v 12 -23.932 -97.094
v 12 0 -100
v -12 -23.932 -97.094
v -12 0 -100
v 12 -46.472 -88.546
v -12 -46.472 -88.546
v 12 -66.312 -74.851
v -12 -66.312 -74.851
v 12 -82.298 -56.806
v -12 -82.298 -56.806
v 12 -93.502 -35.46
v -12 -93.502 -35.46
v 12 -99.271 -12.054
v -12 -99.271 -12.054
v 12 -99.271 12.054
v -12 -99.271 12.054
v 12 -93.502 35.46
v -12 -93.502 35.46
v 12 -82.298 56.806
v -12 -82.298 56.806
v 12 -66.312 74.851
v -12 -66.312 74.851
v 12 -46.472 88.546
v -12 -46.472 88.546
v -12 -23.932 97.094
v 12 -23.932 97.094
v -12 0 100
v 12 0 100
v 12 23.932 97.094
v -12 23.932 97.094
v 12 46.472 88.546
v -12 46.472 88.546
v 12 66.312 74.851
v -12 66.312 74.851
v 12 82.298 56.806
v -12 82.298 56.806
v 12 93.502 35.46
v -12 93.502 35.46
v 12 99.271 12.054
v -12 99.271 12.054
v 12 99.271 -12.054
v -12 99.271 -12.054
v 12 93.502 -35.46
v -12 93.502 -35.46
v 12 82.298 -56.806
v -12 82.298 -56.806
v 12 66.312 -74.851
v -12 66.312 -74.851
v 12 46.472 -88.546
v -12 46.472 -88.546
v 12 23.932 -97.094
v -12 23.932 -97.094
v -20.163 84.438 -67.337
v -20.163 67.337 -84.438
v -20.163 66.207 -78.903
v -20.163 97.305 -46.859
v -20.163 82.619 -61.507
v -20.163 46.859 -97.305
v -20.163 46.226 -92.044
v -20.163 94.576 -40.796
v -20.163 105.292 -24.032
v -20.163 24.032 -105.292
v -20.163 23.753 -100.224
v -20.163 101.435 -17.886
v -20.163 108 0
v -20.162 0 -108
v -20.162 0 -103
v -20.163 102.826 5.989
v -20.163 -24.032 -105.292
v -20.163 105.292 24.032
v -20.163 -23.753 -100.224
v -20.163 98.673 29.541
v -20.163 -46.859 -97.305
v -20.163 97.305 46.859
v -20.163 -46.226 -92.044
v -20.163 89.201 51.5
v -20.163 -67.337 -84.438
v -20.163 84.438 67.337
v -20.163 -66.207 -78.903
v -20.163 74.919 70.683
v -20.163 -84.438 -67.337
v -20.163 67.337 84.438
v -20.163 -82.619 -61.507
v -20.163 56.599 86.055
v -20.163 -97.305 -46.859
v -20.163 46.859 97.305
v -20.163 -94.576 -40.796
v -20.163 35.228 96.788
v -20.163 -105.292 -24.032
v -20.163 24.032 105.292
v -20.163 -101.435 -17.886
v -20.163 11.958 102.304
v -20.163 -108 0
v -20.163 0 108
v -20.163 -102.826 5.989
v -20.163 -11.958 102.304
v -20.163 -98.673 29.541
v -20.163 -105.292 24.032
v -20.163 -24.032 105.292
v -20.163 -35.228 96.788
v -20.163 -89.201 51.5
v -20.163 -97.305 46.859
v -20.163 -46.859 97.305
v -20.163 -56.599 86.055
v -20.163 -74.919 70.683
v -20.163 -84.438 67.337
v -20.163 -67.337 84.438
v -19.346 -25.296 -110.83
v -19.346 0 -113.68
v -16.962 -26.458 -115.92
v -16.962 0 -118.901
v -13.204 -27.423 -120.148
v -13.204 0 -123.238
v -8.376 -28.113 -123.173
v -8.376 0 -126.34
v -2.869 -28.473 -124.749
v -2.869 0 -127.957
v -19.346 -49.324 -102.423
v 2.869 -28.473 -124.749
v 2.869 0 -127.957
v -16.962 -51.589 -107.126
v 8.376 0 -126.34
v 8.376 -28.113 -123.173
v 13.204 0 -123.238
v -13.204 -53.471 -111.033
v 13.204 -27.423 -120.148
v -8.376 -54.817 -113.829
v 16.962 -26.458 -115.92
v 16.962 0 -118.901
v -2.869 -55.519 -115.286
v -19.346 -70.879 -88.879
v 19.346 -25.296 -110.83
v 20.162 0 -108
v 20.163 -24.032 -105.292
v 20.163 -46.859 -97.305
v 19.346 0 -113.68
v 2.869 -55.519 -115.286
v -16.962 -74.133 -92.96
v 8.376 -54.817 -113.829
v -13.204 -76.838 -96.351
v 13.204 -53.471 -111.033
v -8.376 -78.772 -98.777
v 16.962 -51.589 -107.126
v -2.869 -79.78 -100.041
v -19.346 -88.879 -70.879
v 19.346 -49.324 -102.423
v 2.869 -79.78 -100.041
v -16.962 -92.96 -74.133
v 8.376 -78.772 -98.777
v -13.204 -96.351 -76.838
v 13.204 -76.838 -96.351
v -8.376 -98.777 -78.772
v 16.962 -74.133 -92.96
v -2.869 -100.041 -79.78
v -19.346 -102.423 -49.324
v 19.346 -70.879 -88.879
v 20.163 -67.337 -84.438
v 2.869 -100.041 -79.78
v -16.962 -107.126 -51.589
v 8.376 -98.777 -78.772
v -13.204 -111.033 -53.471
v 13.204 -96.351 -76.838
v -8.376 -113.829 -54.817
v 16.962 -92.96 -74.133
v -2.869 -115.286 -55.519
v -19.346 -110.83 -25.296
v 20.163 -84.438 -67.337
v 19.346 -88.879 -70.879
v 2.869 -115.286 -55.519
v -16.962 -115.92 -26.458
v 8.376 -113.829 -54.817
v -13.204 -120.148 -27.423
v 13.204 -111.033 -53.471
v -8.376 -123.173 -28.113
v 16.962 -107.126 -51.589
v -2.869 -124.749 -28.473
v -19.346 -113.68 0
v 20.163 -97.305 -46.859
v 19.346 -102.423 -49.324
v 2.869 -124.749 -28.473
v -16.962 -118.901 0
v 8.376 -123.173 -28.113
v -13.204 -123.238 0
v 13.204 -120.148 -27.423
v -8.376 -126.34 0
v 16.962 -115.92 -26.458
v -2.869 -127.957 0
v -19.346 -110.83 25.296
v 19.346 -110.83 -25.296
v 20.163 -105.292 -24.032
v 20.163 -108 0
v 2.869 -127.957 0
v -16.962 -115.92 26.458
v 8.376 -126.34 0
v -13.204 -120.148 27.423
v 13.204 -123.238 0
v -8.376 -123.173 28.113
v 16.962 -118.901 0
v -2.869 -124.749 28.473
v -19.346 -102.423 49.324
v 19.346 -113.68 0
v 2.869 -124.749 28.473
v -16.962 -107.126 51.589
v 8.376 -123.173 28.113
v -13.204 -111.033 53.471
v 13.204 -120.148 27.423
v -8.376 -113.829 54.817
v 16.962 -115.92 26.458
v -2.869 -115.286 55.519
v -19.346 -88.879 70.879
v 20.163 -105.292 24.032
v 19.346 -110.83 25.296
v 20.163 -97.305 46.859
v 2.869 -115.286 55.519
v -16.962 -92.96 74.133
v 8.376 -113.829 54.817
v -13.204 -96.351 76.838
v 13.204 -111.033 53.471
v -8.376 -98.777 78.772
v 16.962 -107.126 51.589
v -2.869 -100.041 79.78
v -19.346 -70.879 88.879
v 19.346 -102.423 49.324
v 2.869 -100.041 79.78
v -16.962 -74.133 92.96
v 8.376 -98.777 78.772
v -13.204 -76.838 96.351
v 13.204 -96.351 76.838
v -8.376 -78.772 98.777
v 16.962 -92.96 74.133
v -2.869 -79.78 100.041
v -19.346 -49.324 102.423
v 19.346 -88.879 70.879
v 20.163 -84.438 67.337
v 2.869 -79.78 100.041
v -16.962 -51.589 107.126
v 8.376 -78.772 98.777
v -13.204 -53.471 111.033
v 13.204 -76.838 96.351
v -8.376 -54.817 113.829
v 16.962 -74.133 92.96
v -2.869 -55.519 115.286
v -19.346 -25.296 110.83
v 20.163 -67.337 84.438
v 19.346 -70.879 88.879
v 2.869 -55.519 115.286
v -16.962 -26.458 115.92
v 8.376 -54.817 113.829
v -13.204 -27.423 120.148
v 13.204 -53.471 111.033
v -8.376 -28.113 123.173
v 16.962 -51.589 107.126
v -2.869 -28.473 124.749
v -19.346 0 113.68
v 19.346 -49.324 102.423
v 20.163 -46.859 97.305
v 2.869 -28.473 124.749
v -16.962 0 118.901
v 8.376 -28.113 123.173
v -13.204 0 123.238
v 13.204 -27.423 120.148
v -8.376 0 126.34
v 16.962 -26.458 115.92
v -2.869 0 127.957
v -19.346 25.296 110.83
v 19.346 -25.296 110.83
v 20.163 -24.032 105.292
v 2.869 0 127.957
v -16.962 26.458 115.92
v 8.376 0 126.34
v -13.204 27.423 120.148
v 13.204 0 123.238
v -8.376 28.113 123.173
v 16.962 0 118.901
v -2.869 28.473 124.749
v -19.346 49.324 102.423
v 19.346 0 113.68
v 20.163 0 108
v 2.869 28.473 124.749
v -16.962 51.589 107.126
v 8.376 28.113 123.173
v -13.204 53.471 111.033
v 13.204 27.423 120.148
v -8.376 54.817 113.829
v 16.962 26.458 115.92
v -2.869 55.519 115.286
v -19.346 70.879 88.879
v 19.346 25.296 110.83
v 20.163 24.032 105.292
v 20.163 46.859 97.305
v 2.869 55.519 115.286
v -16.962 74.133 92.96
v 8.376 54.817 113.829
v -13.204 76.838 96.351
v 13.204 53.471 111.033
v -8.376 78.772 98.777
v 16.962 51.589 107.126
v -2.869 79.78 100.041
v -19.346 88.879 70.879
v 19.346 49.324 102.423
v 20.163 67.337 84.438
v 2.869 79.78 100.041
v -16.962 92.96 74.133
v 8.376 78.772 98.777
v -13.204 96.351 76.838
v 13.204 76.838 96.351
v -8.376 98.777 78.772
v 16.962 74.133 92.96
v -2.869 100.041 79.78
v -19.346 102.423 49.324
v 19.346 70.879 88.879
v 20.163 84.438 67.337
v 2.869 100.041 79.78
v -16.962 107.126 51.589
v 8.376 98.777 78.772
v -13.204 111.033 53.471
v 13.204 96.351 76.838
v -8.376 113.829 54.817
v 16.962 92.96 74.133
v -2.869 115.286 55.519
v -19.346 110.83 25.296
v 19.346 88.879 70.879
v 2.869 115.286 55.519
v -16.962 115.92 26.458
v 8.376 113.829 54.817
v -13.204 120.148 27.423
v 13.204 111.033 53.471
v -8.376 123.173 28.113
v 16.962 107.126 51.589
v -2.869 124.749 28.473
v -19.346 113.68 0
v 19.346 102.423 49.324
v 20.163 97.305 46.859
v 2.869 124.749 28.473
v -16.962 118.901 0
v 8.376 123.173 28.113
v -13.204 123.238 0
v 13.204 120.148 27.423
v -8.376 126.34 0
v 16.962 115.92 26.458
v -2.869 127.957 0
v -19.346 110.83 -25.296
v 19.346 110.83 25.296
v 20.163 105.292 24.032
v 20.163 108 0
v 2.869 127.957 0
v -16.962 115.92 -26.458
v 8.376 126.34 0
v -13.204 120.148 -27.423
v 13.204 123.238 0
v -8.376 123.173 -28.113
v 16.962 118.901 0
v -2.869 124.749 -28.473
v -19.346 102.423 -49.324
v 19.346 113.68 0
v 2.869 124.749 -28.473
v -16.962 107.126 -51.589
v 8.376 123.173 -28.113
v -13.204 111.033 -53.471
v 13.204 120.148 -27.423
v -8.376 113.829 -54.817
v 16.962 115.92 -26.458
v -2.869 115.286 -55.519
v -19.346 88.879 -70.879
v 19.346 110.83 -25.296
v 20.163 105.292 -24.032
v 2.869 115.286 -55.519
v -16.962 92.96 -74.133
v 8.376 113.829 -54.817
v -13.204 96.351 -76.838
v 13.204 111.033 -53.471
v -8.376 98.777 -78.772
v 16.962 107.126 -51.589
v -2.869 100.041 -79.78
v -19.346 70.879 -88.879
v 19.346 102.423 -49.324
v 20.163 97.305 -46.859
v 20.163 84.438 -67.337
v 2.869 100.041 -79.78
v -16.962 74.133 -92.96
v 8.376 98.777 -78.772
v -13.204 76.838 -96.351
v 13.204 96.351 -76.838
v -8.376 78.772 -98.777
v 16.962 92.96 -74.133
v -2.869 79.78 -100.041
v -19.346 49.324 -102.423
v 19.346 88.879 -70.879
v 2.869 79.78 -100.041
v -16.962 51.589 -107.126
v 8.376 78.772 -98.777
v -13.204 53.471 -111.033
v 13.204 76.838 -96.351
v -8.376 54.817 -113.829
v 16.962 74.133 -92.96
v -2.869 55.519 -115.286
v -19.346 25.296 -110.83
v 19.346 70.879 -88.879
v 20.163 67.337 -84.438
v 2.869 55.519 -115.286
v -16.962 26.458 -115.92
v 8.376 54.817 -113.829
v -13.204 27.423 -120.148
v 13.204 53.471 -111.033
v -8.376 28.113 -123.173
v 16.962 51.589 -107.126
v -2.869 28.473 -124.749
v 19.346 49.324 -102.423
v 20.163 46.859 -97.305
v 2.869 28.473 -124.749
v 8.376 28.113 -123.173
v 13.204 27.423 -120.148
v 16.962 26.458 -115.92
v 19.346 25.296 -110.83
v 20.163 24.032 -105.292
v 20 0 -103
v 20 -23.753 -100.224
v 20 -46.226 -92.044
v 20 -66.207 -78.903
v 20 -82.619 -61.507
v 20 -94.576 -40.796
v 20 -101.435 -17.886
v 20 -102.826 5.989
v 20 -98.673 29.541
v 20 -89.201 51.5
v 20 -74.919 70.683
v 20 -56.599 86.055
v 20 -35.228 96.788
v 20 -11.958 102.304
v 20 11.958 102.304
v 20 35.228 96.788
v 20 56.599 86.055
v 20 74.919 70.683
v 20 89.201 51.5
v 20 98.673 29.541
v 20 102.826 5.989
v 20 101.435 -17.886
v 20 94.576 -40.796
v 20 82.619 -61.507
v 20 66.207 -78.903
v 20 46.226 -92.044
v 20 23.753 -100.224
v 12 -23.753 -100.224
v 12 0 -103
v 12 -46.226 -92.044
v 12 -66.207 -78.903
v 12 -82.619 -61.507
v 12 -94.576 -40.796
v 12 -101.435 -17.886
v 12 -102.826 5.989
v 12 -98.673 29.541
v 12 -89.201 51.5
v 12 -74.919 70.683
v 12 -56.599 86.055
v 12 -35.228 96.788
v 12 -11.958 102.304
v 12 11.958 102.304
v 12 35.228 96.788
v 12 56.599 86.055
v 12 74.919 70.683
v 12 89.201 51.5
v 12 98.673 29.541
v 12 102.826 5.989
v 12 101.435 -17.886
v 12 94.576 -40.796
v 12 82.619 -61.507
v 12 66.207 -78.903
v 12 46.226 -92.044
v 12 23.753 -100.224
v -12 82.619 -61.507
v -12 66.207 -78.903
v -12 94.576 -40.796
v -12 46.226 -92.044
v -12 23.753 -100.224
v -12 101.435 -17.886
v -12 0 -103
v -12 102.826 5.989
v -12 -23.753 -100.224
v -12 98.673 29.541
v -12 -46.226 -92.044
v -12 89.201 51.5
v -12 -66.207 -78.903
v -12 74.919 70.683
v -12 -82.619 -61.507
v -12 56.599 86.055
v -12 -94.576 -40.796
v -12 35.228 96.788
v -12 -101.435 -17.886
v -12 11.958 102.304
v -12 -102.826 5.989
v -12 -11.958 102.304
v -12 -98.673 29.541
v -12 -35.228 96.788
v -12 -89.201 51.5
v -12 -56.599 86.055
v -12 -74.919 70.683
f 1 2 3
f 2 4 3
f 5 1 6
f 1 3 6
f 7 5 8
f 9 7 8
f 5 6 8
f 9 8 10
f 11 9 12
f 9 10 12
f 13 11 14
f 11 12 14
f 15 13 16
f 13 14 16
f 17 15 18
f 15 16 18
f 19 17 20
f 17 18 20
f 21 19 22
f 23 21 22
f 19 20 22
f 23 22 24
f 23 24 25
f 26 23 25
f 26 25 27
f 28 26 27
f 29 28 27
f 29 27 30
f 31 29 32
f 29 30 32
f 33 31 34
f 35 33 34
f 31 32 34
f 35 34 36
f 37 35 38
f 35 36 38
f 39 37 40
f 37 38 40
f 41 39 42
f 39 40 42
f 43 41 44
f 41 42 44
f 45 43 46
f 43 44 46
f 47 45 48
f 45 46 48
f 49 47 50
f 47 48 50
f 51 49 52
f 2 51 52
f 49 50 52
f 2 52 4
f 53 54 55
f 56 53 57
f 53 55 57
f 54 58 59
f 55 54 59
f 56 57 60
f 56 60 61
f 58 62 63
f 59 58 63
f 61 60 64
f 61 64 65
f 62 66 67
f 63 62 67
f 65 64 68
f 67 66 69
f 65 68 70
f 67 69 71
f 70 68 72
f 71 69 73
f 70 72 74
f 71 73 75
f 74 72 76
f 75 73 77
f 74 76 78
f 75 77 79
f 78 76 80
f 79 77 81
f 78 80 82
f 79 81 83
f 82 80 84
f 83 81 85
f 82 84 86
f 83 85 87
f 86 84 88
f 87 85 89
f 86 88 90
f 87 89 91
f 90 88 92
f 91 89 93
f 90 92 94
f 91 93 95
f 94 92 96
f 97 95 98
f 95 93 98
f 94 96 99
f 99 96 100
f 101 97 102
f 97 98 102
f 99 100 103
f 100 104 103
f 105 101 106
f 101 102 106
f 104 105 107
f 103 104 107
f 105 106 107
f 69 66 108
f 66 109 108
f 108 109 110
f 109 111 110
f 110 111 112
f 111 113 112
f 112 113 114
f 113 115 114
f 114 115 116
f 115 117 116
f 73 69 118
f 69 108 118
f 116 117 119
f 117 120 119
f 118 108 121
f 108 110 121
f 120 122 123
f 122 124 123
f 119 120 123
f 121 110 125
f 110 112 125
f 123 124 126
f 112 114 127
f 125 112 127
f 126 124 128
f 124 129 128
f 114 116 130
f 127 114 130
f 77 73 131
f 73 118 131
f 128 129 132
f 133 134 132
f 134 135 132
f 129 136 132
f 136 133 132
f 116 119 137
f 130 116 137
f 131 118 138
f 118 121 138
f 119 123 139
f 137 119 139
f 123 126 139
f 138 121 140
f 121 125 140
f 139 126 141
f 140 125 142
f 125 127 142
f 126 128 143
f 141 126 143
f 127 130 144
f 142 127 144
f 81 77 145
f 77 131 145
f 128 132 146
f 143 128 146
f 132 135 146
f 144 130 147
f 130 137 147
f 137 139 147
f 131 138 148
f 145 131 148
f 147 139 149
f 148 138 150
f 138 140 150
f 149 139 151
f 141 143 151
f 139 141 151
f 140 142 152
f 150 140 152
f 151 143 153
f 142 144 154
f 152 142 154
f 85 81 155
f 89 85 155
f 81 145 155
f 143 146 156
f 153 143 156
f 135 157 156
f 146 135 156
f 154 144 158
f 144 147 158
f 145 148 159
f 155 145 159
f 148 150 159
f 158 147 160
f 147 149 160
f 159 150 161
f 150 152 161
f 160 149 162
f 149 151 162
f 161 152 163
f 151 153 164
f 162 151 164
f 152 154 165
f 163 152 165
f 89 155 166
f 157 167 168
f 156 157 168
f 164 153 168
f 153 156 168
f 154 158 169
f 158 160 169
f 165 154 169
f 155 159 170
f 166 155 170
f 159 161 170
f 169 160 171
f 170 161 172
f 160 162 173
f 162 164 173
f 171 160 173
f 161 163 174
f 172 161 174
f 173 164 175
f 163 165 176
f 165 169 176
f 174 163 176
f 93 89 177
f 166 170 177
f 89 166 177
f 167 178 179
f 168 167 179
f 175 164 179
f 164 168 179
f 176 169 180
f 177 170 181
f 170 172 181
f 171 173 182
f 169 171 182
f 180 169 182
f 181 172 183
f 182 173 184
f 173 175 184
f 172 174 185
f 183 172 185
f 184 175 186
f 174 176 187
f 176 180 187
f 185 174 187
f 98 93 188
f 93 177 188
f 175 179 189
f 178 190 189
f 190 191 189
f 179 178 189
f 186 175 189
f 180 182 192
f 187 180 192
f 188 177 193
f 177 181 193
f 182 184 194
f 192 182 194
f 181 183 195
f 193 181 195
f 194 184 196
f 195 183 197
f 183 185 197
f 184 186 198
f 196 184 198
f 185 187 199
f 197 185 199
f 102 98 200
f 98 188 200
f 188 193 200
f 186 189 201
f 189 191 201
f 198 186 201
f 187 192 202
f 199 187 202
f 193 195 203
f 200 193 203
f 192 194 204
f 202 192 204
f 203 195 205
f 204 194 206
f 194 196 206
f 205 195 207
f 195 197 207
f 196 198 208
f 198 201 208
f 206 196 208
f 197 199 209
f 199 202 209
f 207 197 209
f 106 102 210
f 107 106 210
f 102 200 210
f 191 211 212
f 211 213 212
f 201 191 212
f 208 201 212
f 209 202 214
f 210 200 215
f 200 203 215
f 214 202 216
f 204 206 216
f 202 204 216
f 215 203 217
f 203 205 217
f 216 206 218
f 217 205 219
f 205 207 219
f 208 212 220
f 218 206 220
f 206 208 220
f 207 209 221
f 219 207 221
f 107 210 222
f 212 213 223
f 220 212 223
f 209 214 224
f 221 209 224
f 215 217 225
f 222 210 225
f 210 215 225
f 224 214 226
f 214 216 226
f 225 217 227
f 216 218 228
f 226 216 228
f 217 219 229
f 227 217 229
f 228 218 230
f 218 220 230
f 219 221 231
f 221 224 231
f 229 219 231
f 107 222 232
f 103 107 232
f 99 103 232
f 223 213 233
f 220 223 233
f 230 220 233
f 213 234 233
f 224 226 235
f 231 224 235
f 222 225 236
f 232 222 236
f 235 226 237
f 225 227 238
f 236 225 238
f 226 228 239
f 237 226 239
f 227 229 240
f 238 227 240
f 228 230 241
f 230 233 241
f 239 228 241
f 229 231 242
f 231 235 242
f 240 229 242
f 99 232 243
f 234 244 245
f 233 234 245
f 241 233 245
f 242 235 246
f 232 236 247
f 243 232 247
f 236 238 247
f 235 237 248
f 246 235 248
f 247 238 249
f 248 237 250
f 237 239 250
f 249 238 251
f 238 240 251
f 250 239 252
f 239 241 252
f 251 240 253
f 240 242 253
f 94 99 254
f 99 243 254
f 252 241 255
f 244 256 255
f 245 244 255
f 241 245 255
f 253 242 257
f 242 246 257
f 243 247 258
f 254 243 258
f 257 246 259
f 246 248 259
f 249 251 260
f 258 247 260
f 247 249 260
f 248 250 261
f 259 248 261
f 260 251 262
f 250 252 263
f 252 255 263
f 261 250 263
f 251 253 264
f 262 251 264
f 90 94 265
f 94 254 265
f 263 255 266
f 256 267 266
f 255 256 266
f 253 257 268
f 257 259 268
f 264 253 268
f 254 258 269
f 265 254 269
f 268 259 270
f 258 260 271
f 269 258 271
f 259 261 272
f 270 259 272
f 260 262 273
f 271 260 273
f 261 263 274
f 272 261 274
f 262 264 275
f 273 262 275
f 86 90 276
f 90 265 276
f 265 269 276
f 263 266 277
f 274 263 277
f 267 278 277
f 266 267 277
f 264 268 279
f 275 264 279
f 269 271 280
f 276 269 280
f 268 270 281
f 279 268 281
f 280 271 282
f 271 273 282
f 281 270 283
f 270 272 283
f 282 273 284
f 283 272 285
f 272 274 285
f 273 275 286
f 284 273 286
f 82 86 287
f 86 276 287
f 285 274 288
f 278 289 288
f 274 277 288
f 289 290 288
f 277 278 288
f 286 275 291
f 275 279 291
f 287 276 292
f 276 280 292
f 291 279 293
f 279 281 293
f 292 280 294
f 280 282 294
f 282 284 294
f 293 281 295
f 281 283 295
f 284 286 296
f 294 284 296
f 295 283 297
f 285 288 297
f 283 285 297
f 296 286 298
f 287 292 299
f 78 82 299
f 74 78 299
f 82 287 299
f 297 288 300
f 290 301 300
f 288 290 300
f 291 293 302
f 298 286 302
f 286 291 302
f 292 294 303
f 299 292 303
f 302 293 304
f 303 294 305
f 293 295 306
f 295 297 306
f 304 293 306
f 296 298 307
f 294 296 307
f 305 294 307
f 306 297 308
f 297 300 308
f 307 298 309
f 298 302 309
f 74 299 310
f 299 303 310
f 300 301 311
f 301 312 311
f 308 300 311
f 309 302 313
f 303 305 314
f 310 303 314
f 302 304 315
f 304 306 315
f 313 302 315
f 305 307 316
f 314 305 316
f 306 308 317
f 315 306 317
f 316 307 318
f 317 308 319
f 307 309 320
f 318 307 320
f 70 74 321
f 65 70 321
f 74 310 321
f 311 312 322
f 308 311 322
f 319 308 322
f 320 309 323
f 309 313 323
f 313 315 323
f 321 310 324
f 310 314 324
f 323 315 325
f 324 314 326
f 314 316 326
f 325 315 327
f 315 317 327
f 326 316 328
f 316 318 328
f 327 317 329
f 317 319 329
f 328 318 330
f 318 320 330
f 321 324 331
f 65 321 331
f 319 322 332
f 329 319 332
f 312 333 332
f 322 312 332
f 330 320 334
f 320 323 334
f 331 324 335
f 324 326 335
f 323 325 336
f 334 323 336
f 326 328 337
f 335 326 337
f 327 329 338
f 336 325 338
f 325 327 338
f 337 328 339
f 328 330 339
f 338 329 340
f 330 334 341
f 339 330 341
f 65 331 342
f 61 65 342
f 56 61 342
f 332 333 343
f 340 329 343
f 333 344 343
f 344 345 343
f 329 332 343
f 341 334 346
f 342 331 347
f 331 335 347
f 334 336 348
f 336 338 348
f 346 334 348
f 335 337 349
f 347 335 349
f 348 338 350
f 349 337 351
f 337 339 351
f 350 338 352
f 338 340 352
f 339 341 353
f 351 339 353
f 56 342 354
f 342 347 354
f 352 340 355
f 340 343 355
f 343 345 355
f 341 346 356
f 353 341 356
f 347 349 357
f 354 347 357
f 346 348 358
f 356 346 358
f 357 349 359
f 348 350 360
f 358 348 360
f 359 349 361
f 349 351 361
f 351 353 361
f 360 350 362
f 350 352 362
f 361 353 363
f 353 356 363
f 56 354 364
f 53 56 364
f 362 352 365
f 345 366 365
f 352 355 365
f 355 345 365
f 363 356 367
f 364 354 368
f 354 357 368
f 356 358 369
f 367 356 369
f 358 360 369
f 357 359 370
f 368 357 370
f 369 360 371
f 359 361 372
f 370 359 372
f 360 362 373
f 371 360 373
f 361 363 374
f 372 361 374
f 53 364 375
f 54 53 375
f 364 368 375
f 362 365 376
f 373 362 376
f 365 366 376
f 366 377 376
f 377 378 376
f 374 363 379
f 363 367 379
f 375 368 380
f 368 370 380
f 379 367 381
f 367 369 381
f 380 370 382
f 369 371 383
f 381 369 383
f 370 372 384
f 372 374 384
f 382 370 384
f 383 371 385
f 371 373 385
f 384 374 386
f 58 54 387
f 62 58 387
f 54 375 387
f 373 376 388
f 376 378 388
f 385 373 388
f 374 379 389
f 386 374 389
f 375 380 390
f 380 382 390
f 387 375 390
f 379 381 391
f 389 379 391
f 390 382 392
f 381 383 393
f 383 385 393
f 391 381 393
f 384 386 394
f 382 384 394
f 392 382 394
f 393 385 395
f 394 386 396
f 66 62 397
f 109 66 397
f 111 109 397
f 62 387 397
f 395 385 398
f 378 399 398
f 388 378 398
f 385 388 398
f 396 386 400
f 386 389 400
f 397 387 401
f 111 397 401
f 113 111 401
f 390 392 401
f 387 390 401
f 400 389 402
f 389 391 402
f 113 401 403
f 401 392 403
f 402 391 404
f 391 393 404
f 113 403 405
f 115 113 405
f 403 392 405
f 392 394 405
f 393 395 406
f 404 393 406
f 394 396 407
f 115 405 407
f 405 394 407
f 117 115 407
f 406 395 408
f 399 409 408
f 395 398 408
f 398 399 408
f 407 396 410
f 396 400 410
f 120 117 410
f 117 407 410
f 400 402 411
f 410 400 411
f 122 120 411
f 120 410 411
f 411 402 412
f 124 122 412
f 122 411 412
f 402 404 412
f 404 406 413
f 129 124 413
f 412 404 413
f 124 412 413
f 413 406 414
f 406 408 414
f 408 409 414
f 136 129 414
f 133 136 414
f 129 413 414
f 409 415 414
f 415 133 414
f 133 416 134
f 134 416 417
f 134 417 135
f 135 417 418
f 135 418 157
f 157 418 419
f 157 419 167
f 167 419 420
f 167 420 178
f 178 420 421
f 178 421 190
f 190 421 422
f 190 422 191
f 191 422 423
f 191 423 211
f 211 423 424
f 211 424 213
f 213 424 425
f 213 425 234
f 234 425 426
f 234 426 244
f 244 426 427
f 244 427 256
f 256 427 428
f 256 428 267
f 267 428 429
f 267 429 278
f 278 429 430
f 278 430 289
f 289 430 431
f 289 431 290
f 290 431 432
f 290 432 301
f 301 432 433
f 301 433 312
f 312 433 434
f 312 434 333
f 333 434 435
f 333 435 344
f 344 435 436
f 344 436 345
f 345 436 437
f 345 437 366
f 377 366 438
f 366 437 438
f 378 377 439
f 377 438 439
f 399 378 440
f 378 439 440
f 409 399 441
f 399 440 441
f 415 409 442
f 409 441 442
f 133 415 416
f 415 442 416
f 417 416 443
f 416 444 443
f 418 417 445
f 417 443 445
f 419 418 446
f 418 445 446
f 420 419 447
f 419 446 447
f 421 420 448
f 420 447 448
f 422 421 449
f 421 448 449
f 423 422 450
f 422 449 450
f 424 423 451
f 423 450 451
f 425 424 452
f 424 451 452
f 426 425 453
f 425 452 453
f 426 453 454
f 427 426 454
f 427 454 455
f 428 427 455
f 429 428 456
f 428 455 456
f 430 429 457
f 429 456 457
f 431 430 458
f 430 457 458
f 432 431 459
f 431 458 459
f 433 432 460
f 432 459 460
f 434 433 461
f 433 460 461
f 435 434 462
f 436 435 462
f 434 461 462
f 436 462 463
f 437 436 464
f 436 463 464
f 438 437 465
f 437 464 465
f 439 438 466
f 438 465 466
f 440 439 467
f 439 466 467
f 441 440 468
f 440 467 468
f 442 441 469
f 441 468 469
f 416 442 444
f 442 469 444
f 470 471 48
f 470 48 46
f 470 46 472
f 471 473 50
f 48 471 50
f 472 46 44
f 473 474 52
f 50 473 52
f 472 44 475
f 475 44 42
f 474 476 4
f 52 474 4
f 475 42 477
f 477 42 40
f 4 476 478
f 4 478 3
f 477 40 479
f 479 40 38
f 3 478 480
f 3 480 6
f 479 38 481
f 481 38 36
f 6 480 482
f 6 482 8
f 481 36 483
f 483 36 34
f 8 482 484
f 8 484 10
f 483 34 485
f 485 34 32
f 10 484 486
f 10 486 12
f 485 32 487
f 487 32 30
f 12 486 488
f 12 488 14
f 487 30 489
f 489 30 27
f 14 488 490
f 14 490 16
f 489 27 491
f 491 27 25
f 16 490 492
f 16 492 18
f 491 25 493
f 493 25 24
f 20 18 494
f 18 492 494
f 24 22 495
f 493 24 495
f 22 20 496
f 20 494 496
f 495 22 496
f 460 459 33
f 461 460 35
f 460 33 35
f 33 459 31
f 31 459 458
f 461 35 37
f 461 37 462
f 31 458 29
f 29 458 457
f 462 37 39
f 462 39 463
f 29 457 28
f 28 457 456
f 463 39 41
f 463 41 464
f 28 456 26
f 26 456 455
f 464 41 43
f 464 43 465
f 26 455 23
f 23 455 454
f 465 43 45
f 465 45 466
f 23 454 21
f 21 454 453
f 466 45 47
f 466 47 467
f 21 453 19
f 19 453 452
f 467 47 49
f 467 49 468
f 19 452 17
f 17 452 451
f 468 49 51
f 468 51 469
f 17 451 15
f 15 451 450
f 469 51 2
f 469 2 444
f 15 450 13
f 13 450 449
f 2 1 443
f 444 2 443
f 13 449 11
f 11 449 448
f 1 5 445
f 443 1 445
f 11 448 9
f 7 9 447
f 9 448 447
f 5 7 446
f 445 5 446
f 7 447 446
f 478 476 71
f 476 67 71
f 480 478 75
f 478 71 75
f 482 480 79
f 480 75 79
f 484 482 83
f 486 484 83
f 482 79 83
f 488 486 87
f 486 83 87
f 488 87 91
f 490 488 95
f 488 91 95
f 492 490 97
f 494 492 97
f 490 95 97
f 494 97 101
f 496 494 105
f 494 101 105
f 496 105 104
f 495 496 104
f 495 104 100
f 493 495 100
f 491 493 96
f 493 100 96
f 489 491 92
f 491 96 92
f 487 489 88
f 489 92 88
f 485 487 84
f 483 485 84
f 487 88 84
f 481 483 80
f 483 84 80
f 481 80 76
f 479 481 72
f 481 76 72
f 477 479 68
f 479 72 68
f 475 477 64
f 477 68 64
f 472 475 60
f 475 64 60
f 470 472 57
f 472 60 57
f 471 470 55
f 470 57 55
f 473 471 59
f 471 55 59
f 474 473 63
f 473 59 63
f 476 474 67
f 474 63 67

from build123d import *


with BuildPart() as part:
    # Sketch1 → Revolve1 (revolve)
    with BuildSketch(Plane.XY, mode=Mode.PRIVATE) as revolve1_sk:
        with BuildLine():
            Line((20.1625, 108), (20, 103))
            Line((20, 103), (12, 103))
            Line((12, 103), (12, 100))
            Line((12, 100), (-12, 100))
            Line((-12, 100), (-12, 103))
            Line((-12, 103), (-20.1625, 103))
            Line((-20.1625, 103), (-20.1625, 108))
            ThreePointArc((-20.1625, 108), (0, 128.1625), (20.1625, 108))
        make_face()
    revolve(revolve1_sk.sketch.rotate(Axis((88.99, 0, 0), (-1, 0, 0)), 90), axis=Axis((88.99, 0, 0), (-1, 0, 0)))


solid = part.part
